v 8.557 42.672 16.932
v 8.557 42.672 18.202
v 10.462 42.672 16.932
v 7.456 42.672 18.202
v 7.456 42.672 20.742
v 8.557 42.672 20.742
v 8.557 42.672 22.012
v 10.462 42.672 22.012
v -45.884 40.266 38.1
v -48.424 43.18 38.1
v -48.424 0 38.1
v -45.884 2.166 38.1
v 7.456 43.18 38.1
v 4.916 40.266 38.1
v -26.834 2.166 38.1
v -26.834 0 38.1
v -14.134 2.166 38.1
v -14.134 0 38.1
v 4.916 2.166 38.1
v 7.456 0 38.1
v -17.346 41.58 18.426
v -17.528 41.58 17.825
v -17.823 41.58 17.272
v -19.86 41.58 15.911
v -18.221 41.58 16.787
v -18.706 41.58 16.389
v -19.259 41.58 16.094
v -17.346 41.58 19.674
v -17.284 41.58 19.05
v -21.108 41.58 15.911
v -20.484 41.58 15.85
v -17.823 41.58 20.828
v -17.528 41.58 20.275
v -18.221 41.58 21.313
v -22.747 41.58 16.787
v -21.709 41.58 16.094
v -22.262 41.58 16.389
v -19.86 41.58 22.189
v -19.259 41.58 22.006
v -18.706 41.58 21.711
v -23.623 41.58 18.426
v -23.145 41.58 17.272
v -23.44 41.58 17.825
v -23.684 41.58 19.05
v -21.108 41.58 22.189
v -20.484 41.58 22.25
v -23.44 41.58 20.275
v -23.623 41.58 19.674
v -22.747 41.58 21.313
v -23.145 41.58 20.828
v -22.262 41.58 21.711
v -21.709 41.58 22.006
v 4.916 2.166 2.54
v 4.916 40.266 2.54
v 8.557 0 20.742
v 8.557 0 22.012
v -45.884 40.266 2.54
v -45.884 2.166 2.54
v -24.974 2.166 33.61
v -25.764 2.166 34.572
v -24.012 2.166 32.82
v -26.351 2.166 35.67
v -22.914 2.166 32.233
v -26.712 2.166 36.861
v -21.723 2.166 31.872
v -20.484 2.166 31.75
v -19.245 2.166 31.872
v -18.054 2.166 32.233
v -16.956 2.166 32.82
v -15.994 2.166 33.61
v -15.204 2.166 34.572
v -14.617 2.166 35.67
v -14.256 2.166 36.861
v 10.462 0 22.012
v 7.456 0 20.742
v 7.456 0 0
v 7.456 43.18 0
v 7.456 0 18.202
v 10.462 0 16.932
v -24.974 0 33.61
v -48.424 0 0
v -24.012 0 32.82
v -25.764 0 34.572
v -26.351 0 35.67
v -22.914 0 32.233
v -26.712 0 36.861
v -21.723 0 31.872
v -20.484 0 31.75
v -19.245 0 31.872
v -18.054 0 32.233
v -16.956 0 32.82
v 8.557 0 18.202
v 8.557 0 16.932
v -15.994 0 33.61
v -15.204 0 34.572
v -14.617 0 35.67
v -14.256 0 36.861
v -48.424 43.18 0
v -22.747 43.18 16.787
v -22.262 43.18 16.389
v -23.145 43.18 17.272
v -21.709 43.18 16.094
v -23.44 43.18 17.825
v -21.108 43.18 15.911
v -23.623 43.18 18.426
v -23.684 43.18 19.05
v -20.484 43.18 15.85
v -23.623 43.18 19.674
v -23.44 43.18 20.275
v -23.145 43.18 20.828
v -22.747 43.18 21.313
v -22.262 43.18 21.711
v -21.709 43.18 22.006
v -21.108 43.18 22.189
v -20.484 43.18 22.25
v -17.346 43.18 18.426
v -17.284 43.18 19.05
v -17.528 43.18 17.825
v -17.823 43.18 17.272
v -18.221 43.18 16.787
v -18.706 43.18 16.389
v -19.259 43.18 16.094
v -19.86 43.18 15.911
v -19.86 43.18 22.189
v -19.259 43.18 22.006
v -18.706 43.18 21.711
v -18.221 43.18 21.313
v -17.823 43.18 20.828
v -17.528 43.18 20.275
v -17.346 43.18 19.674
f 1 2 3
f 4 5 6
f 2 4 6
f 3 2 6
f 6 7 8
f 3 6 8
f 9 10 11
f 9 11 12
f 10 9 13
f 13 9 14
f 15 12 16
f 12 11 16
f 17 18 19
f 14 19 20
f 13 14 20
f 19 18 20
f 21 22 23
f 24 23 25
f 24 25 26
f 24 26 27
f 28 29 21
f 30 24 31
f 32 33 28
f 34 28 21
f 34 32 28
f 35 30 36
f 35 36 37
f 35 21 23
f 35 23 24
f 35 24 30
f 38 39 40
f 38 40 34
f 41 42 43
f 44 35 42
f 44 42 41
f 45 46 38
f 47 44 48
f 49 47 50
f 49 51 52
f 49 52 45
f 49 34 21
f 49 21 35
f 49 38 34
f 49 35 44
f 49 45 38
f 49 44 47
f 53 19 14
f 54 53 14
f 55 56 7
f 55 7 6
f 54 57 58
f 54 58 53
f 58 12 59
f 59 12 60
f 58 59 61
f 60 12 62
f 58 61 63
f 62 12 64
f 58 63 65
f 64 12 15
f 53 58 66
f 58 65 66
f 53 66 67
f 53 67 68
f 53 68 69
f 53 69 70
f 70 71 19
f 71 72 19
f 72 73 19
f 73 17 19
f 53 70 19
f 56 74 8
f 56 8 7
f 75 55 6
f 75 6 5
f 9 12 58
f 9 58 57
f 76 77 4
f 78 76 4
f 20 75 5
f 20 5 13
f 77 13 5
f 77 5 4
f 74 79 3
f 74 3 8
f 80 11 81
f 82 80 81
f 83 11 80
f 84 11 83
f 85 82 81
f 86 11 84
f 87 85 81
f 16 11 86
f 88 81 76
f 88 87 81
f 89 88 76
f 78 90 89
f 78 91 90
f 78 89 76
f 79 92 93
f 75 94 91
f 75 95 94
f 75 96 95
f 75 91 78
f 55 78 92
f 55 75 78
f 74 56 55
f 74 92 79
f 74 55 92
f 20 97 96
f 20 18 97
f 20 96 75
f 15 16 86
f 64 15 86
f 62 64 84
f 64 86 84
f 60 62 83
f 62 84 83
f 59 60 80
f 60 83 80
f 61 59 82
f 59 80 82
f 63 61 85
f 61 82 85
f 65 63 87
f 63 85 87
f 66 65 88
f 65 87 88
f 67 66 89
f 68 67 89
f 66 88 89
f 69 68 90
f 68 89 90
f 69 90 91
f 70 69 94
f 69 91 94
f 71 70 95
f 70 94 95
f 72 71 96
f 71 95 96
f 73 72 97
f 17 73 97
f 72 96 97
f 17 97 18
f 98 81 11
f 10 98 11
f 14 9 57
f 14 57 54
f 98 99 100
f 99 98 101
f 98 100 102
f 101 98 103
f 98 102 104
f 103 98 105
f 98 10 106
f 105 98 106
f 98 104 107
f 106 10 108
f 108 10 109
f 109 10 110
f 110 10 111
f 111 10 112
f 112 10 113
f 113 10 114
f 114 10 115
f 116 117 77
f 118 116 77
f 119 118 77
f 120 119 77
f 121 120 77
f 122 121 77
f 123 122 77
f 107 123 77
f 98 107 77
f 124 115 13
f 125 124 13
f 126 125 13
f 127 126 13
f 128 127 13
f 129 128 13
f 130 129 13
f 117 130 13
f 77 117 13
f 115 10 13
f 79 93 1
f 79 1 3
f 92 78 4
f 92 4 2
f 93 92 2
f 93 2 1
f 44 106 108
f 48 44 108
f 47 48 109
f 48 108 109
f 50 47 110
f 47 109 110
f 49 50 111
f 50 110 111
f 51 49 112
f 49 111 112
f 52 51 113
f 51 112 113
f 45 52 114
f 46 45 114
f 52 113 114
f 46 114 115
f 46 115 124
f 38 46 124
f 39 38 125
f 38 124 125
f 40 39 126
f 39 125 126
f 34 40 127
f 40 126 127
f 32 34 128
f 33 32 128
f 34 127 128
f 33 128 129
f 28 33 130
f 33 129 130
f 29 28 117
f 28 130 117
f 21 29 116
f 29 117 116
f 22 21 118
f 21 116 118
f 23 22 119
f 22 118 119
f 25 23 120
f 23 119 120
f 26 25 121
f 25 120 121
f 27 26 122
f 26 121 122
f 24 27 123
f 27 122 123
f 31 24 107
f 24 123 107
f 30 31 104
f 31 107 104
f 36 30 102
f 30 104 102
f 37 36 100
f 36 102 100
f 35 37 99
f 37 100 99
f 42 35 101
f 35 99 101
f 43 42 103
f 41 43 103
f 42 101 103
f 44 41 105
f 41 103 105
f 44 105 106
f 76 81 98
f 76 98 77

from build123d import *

# Parameters (mm, degrees)
F0_W     = 55.88
F0_H     = 38.1
F1_DEPTH = 43.18
F2_W     = 50.8
F2_H     = 38.1
F3_DEPTH = 35.56
F4_R     = 6.35
F5_DEPTH = 25.4
F6_R     = 3.2
F7_DEPTH = 1.6002
F9_DEPTH = 42.672


with BuildPart() as f1:
    # F0 (on Front) → F1 (new body)
    with BuildSketch(Plane.XZ):
        with Locations((-20.484024, 19.05)):
            Rectangle(F0_W, F0_H)
    extrude(amount=-F1_DEPTH)

    # F2 (on face) → F3 (cut)
    with BuildSketch(Plane.XY.offset(38.1)):
        with Locations((-20.484024, 21.216264)):
            Rectangle(F2_W, F2_H)
    extrude(amount=-F3_DEPTH, mode=Mode.SUBTRACT)

    # F4 (on face) → F5 (cut)
    with BuildSketch(Plane.XZ):
        with Locations((-20.484024, 38.1)):
            Circle(F4_R)
    extrude(amount=-F5_DEPTH, mode=Mode.SUBTRACT)

    # F6 (on face) → F7 (cut)
    with BuildSketch(Plane(origin=(0, 43.18, 0), x_dir=(-1, 0, 0), z_dir=(0, 1, 0))):
        with Locations((20.484024, 19.05)):
            Circle(F6_R)
    extrude(amount=-F7_DEPTH, mode=Mode.SUBTRACT)

    # F8 (on face) → F9 (join)
    with BuildSketch(Plane.XZ):
        Polygon((8.556618, 22.011659), (8.556618, 20.741659), (7.455976, 20.741659), (7.455976, 18.201659), (8.556618, 18.201659), (8.556618, 16.931659), (10.461618, 16.931659), (10.461618, 22.011659), align=None)
    extrude(amount=-F9_DEPTH)


solid = f1.part
